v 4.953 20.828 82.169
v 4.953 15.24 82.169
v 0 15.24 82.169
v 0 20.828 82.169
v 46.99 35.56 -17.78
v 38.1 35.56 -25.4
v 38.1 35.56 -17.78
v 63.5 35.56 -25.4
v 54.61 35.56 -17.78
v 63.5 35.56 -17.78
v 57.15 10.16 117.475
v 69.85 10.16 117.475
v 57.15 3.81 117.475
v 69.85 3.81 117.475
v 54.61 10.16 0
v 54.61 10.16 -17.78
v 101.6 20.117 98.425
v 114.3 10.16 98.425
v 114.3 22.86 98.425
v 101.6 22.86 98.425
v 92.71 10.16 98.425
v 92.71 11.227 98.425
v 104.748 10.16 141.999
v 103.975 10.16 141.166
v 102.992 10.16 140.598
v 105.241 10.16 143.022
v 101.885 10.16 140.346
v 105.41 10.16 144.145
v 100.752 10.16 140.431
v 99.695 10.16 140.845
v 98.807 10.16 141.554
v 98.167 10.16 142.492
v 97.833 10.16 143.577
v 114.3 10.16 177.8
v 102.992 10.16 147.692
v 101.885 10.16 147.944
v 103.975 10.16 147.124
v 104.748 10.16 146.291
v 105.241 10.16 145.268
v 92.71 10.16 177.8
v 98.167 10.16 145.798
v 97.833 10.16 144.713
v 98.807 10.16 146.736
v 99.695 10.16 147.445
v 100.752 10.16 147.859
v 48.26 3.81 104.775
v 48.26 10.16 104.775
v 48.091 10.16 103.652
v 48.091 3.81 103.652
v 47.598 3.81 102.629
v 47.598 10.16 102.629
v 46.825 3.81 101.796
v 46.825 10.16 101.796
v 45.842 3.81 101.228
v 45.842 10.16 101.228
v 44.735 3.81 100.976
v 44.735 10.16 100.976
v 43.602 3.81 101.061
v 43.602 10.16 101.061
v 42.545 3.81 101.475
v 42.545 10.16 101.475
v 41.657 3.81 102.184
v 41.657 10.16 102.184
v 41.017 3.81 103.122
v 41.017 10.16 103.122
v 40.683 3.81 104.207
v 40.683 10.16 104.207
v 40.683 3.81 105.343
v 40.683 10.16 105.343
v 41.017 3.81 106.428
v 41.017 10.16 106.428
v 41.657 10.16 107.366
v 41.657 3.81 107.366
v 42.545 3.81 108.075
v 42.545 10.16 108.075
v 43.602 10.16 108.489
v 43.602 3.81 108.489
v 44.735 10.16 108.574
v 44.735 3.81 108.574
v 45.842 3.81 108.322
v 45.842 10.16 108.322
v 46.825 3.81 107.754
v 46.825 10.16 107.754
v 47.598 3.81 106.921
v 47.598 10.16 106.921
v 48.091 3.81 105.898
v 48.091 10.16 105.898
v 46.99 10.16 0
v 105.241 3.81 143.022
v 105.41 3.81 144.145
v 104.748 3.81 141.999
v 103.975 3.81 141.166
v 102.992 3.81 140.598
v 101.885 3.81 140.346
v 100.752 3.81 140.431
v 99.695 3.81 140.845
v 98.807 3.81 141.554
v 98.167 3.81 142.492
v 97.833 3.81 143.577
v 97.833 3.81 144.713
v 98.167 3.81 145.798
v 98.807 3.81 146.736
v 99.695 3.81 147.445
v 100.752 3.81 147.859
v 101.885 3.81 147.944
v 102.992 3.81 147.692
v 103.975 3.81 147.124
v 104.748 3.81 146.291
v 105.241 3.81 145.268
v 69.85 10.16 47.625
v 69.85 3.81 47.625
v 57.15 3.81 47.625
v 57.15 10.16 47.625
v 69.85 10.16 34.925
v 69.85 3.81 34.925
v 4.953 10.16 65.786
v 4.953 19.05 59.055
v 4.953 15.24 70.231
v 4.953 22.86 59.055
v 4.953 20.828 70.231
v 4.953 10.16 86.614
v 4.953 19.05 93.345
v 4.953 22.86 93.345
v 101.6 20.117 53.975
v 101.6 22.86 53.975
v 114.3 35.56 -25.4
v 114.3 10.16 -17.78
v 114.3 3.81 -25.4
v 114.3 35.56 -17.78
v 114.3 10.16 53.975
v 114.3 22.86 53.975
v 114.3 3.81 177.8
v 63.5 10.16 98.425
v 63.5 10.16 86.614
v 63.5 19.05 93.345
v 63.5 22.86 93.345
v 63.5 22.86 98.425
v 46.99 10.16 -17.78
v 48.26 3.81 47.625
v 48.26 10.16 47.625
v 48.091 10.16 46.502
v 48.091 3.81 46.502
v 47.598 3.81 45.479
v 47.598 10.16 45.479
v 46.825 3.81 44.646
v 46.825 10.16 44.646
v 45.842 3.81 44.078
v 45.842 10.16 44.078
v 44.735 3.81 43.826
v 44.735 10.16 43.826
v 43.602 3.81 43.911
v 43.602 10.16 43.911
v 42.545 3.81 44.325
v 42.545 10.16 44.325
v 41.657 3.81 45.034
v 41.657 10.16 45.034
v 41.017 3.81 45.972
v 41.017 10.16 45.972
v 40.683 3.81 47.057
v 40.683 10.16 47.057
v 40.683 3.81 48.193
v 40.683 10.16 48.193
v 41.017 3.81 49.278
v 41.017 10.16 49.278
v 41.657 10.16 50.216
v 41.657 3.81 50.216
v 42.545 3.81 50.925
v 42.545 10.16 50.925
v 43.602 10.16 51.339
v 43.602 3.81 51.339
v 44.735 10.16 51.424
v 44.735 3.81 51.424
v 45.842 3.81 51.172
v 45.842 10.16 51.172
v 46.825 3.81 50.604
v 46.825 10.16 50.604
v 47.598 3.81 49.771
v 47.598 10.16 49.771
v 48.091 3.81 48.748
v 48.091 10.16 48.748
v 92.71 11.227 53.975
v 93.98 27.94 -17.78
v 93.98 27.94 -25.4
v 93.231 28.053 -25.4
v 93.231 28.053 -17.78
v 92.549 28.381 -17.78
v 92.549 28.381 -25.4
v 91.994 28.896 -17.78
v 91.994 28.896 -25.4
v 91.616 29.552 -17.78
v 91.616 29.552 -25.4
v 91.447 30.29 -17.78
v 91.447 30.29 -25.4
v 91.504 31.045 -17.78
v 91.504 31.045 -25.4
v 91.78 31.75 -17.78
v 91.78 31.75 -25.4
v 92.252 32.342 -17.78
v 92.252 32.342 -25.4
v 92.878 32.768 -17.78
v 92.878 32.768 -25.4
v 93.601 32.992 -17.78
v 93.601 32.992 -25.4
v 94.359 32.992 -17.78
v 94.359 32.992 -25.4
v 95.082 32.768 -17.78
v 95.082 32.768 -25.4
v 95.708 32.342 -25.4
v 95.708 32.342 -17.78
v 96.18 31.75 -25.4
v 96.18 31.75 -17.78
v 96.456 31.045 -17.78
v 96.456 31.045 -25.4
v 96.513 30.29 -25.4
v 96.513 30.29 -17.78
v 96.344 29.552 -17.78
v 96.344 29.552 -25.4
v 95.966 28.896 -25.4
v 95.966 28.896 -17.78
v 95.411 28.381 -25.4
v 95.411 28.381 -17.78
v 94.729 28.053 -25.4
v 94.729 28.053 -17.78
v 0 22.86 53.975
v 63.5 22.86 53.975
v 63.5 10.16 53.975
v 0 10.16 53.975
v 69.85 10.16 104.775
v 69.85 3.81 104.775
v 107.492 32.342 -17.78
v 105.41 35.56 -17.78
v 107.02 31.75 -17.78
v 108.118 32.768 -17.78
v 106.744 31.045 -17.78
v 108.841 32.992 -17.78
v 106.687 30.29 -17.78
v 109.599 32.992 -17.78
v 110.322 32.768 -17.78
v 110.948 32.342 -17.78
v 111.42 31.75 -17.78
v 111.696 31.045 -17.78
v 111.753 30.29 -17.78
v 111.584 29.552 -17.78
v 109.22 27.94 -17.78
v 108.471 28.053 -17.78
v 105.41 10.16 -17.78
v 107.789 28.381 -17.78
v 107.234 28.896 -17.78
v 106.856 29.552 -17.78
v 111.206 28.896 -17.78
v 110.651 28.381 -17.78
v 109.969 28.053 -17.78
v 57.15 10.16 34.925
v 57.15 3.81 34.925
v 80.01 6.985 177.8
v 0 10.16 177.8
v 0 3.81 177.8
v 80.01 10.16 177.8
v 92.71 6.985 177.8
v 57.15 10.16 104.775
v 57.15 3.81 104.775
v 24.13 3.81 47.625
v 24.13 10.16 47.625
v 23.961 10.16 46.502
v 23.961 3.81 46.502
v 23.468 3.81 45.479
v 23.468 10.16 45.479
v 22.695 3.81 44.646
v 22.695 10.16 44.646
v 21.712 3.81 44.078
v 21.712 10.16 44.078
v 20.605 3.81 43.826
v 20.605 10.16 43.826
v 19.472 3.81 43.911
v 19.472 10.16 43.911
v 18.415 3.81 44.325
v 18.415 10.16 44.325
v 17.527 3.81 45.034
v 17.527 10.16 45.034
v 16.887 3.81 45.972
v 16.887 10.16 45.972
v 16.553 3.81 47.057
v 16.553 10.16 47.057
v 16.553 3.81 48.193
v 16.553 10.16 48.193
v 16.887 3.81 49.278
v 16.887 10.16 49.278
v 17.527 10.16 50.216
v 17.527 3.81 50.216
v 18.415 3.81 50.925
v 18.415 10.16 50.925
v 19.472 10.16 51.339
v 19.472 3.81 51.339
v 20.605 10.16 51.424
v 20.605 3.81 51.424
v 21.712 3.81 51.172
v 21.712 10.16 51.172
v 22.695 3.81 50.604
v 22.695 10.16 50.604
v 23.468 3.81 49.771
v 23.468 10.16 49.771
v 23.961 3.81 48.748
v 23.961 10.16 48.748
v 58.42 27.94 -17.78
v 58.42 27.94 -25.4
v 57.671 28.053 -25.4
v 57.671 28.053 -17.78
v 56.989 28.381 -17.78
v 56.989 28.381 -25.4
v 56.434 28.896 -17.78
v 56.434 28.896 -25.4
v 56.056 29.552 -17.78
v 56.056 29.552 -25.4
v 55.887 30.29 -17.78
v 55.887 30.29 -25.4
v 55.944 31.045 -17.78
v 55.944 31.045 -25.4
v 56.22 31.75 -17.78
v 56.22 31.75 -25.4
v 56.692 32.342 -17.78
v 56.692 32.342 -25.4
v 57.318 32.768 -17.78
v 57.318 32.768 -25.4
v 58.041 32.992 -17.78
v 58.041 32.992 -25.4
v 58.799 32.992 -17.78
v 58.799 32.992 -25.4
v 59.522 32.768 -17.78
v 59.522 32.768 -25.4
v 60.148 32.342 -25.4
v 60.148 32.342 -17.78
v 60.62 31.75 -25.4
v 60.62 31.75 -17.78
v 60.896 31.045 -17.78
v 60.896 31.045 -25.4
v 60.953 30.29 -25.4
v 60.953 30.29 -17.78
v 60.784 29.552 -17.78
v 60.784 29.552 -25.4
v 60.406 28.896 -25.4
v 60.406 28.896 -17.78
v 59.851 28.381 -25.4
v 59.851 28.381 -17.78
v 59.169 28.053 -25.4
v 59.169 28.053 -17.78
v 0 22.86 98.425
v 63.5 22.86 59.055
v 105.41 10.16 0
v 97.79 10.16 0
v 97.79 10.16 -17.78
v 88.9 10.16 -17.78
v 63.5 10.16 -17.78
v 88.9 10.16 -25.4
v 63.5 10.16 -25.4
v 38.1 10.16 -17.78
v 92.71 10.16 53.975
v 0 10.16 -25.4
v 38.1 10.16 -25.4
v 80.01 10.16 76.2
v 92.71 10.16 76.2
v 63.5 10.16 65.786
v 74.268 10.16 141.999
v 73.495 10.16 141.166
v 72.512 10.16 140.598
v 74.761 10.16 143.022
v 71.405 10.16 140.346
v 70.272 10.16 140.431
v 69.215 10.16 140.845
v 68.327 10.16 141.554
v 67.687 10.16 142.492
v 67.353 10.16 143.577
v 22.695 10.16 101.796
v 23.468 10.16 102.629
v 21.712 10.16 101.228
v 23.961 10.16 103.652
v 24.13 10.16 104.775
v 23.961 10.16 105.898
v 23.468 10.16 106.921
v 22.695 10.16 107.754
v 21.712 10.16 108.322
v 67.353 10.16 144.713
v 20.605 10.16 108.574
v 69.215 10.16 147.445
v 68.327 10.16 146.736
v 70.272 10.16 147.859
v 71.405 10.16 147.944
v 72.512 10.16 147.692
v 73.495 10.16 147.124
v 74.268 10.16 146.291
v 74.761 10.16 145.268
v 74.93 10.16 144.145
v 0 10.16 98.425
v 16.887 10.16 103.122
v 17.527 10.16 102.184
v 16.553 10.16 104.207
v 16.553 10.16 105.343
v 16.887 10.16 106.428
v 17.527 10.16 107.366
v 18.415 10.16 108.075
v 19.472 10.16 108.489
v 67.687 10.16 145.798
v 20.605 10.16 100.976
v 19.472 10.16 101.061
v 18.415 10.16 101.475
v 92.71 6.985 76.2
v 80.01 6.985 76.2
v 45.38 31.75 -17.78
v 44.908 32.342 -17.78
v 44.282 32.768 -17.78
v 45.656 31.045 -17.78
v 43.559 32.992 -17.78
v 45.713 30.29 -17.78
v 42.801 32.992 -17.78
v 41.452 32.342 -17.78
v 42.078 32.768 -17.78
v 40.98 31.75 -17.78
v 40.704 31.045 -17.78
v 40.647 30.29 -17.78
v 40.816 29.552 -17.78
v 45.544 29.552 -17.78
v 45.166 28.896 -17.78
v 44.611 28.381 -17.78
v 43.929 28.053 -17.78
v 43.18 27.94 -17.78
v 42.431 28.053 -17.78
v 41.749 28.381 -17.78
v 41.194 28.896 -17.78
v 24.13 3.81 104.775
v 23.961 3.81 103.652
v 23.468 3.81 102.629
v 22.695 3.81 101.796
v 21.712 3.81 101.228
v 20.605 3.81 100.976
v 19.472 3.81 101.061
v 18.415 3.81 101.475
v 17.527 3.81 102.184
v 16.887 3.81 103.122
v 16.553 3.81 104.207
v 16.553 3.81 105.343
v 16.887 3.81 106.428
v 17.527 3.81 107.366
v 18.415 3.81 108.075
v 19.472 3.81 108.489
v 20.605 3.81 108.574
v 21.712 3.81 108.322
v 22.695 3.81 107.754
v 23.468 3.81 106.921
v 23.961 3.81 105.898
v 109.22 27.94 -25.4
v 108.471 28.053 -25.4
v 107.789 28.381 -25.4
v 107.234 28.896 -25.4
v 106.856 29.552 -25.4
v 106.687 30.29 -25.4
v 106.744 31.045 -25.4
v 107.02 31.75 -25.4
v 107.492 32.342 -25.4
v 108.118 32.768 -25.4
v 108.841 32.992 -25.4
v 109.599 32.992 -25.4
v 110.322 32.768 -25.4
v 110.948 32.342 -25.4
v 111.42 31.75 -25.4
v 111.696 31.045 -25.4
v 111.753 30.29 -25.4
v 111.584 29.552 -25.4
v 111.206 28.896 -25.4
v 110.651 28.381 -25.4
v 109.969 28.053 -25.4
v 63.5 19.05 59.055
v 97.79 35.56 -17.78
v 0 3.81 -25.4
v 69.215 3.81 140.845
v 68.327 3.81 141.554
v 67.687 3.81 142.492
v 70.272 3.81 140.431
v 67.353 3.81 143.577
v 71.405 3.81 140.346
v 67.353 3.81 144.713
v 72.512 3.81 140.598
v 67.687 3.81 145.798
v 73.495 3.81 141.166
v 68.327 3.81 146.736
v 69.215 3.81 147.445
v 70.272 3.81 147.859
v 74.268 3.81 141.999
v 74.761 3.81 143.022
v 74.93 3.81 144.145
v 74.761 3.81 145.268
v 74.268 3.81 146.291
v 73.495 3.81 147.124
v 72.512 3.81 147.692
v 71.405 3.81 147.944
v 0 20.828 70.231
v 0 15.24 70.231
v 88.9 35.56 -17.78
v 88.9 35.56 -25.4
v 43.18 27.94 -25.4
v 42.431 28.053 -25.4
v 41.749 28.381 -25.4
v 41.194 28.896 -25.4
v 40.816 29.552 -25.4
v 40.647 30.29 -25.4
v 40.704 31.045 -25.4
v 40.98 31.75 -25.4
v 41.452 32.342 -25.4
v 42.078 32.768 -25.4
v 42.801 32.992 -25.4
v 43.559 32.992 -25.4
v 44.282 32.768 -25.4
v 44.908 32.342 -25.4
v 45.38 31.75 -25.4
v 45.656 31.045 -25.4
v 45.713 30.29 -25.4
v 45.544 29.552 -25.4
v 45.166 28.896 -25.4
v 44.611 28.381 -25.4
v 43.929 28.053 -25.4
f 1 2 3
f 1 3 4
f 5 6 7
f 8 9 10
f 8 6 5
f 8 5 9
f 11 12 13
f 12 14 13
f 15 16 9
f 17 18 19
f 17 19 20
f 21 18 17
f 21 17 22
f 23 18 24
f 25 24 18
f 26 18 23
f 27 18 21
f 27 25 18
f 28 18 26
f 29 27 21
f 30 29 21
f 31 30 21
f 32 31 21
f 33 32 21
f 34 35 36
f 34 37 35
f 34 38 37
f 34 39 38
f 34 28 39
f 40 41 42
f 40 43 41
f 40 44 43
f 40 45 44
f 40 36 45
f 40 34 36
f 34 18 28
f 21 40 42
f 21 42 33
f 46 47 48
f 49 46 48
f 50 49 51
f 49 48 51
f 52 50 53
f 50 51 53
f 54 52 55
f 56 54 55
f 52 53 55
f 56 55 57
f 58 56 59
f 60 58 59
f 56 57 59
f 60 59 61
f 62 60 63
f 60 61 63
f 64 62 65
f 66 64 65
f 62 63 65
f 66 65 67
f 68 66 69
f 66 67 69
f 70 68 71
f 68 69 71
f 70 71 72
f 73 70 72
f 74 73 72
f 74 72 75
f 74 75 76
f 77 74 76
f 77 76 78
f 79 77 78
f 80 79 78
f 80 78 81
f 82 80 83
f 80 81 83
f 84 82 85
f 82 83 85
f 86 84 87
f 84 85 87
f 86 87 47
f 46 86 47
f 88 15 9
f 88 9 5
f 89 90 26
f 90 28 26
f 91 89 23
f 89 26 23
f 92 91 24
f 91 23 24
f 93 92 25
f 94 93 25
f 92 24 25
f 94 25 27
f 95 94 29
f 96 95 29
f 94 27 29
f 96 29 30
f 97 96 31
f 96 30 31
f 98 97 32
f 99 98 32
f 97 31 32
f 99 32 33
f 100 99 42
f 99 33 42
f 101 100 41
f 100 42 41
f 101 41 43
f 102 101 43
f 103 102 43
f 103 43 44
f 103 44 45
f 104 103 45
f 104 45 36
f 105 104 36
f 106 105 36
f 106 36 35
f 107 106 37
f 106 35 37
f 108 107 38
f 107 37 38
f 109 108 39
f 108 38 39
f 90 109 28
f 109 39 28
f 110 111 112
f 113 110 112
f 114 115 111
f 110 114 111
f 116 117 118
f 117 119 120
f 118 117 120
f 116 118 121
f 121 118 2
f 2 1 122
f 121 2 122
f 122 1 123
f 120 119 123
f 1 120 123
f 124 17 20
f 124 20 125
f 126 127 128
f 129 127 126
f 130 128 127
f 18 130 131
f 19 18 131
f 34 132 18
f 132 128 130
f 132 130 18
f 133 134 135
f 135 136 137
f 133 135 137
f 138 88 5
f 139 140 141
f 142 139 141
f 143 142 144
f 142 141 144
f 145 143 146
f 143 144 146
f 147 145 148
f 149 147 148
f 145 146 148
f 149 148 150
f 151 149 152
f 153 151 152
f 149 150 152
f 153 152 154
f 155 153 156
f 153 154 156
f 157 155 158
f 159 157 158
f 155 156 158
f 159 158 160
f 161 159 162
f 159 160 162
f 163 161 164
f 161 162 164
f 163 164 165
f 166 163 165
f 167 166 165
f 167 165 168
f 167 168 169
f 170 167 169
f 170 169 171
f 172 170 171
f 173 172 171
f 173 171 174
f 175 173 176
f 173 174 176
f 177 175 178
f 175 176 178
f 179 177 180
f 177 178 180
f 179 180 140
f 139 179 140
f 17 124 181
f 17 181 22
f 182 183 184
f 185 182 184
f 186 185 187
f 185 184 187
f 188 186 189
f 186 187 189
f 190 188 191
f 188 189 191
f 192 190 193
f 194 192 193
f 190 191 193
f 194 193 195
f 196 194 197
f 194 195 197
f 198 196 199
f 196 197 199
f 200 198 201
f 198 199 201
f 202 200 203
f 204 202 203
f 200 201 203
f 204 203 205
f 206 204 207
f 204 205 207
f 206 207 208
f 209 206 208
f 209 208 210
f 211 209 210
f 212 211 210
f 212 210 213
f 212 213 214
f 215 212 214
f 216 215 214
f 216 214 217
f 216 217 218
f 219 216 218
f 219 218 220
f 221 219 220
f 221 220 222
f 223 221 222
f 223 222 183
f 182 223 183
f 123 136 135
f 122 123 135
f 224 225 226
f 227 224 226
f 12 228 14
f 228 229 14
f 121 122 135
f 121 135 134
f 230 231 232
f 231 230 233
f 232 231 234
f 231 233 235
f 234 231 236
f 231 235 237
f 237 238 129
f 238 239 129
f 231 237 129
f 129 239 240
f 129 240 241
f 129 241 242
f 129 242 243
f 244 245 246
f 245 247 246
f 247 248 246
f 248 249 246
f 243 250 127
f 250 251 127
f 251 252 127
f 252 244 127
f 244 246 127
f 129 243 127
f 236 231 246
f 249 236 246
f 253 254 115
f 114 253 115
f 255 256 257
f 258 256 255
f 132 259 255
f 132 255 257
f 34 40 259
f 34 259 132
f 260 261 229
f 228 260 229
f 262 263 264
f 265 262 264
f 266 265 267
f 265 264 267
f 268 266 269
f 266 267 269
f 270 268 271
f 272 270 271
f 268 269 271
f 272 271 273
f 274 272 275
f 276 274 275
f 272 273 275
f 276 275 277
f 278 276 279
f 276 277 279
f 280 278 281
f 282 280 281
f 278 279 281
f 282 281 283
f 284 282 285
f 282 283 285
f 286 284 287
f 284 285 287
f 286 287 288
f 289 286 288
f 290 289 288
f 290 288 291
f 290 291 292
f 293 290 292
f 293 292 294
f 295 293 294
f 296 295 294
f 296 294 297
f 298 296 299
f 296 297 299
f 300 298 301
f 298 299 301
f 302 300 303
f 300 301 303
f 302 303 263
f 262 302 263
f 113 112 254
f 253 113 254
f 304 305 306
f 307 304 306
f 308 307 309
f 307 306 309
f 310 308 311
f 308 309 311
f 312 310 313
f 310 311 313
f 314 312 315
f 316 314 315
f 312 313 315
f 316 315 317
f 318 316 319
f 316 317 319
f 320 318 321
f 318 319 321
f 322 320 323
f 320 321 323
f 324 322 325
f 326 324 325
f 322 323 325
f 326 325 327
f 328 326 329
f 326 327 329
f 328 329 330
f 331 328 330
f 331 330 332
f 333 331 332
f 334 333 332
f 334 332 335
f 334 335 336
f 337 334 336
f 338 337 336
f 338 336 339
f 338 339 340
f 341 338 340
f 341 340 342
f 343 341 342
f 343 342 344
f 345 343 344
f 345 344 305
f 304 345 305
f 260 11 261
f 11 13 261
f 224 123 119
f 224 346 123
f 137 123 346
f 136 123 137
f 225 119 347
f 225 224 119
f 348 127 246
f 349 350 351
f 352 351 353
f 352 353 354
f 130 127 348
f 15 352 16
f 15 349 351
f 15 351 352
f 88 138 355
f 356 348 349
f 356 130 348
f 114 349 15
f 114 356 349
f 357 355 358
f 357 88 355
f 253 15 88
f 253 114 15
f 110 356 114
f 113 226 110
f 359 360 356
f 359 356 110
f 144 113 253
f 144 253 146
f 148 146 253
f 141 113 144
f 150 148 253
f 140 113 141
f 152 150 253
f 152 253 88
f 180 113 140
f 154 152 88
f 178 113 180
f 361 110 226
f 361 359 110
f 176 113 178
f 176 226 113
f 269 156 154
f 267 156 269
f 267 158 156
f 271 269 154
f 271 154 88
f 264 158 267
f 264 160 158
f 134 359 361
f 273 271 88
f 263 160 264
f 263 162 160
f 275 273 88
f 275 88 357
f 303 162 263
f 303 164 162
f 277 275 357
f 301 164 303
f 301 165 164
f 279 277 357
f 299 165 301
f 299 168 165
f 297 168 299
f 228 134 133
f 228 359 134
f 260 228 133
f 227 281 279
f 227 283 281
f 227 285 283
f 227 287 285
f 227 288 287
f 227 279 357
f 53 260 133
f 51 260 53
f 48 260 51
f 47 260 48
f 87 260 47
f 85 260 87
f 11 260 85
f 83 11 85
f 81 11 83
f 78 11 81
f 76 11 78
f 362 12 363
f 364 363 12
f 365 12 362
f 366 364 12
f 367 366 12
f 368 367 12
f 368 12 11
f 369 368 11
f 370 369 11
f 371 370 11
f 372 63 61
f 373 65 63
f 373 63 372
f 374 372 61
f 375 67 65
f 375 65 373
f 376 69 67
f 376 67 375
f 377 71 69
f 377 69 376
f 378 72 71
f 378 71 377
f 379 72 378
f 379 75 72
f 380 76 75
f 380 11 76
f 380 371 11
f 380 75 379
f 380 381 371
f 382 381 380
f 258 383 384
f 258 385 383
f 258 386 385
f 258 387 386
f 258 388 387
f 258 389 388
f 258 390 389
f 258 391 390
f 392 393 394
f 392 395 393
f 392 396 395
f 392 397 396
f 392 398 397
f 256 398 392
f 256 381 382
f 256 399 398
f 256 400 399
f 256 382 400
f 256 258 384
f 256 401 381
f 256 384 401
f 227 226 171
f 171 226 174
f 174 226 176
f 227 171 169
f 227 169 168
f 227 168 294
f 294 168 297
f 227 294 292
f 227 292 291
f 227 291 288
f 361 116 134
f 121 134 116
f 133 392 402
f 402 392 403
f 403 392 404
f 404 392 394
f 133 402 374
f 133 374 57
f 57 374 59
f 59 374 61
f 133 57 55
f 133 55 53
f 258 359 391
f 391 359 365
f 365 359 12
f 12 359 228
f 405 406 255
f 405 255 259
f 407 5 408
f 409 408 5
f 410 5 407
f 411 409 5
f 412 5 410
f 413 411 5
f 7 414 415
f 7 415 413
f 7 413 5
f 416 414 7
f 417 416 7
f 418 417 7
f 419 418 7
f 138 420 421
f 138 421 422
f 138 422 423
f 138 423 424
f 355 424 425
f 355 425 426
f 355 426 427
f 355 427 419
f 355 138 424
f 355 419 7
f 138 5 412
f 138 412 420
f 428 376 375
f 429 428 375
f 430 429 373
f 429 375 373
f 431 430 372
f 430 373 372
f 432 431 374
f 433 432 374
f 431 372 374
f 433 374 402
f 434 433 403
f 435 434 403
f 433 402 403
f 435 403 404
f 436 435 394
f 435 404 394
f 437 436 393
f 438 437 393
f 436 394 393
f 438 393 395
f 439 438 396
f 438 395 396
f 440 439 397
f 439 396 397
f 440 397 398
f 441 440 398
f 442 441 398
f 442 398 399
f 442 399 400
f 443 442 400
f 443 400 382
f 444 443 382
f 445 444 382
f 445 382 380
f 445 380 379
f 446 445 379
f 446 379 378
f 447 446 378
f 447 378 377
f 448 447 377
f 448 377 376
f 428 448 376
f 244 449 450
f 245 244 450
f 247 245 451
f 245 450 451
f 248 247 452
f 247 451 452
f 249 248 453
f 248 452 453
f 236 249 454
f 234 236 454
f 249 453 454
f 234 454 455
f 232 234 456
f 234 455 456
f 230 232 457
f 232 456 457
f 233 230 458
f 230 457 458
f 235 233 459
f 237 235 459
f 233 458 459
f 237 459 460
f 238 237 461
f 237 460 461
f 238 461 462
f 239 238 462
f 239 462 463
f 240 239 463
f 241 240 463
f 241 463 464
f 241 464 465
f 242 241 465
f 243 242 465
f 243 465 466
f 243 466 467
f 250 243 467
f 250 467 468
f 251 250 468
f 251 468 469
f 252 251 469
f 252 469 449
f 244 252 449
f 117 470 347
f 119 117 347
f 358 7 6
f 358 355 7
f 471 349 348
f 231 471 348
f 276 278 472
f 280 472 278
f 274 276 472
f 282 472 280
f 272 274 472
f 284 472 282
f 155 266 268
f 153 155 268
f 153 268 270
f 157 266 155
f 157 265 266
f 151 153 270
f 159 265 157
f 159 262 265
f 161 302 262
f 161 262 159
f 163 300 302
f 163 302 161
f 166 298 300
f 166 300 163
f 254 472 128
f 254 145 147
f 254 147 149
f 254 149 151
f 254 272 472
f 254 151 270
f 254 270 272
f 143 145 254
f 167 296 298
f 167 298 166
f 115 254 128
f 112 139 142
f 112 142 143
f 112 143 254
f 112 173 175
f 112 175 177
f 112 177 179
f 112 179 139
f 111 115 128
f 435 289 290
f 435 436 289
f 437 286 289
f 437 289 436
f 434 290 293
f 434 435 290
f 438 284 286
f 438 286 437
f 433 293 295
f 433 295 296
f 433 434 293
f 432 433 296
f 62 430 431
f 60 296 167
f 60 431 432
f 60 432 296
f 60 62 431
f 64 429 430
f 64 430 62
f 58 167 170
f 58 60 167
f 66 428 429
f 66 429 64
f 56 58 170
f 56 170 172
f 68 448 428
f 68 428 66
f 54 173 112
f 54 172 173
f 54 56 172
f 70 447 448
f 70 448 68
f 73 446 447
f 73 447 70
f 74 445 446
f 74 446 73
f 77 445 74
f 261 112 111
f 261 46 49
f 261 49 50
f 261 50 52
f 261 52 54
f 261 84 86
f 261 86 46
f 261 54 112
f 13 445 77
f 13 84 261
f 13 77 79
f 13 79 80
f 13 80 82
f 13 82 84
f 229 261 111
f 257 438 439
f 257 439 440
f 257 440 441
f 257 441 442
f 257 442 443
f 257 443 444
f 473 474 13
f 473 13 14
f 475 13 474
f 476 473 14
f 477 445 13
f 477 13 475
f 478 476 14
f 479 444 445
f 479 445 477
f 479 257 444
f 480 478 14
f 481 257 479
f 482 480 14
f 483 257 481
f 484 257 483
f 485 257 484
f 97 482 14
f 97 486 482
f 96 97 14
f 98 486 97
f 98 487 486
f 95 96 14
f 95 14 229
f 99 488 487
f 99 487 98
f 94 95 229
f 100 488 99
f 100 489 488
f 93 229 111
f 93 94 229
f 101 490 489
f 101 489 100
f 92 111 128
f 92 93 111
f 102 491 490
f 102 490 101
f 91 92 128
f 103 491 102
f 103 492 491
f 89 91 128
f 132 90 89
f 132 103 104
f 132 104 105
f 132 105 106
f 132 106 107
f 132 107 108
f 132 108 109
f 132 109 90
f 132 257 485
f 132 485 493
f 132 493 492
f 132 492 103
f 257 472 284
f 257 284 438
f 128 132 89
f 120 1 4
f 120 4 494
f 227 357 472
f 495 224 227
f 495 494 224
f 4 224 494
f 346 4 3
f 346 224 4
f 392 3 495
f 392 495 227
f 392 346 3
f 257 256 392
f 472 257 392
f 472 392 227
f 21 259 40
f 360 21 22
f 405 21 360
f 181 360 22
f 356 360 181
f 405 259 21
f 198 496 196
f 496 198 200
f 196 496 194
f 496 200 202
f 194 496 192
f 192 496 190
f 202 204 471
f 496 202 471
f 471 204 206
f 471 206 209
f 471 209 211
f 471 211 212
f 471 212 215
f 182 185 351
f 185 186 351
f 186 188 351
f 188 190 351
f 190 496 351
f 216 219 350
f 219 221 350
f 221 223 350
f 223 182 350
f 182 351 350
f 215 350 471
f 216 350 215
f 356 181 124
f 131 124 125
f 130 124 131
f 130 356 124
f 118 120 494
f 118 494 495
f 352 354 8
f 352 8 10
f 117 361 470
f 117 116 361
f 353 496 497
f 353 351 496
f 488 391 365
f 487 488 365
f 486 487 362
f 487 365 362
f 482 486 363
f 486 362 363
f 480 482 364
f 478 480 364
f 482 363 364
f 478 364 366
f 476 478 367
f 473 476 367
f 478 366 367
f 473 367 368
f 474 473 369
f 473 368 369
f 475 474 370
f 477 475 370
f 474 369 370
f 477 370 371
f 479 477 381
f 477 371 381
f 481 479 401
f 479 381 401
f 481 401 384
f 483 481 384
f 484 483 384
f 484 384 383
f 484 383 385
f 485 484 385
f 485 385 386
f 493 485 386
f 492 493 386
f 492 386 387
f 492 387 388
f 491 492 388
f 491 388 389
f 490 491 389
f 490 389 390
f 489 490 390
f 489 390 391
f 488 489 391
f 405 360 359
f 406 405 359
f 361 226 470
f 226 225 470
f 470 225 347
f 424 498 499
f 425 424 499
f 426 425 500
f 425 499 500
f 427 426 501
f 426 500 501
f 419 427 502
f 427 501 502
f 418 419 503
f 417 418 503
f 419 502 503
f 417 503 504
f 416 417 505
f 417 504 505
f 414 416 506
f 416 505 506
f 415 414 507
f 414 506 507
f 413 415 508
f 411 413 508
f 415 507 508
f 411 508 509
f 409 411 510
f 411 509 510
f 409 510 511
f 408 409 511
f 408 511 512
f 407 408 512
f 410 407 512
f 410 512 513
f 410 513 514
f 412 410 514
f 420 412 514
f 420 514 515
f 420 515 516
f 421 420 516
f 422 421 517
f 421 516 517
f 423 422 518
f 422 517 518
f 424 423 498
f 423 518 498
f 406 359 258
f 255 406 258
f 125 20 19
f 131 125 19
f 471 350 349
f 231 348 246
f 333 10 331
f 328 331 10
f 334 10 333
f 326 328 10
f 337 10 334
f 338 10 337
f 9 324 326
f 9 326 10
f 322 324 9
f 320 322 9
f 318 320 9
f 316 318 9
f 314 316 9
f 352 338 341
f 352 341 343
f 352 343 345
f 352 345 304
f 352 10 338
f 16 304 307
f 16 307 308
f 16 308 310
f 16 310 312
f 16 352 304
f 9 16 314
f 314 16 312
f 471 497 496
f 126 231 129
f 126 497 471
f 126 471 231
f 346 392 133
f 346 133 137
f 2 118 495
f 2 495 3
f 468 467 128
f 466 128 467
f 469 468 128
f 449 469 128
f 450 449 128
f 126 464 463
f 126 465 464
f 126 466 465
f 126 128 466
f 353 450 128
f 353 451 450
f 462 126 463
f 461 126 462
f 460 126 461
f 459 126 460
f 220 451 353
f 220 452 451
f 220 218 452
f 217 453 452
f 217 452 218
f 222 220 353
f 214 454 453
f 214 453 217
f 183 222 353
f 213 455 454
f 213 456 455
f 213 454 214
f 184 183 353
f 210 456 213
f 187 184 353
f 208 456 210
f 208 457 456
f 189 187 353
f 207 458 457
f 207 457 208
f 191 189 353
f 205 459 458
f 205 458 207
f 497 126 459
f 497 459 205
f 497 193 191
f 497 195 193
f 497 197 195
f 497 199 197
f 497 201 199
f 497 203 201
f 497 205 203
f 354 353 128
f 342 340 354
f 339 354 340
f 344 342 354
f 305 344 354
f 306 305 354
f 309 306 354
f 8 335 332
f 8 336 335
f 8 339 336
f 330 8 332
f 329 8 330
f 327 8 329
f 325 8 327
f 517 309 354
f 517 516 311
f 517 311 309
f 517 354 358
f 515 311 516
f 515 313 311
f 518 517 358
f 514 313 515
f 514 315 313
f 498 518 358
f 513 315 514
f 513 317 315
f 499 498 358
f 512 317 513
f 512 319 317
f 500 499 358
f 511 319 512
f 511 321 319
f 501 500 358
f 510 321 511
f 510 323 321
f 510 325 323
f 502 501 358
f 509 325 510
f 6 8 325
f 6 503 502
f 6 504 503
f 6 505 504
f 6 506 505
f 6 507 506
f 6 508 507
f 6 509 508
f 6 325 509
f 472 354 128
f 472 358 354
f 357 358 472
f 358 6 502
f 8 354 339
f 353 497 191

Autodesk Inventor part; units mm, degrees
ref_plane "YZ Plane" through (0, 0, 0) normal (1, 0, 0) x (0, 1, 0)
ref_plane "XZ Plane" through (0, 0, 0) normal (0, 1, 0) x (-1, 0, 0)
ref_plane "XY Plane" through (0, 0, 0) normal (0, 0, 1) x (1, 0, 0)
sketch "Sketch1" plane through (0, 0, 0) normal (0, 1, 0) x (-1, 0, 0)
  line L0 (0, 0) -> (-114.3, 0)
  line L1 (-114.3, 0) -> (-114.3, 152.4)
  line L2 (-114.3, 152.4) -> (0, 152.4)
  line L3 (0, 152.4) -> (0, 0)
  line L4 (-57.15, 34.925) -> (-69.85, 34.925)
  line L5 (-69.85, 34.925) -> (-69.85, 47.625)
  line L6 (-69.85, 47.625) -> (-57.15, 47.625)
  line L7 (-57.15, 47.625) -> (-57.15, 34.925)
  line L8 (-57.15, 104.775) -> (-69.85, 104.775)
  line L9 (-69.85, 104.775) -> (-69.85, 117.475)
  line L10 (-69.85, 117.475) -> (-57.15, 117.475)
  line L11 (-57.15, 117.475) -> (-57.15, 104.775)
  dimension "d0" = 152.4
  dimension "d1" = 114.3
  dimension "d2" = 12.7
  dimension "d3" = 12.7
  dimension "d4" = 12.7
  dimension "d5" = 12.7
  dimension "d6" = 34.925
  dimension "d7" = 34.925
  dimension "d8" = 44.45
  dimension "d9" = 44.45
extrude "Extrusion1" add sketch "Sketch1" along normal blind 10.16
sketch "Sketch2" plane through (0, 0, 0) normal (-1, 0, 0) x (0, 0, 1)
  line L0 (0, 10.16) -> (152.4, 10.16) projected
  line L1 (53.975, 10.16) -> (98.425, 10.16)
  line L2 (98.425, 10.16) -> (98.425, 22.86)
  line L3 (98.425, 22.86) -> (93.345, 22.86)
  line L4 (93.345, 22.86) -> (93.345, 19.05)
  line L5 (93.345, 19.05) -> (86.614, 10.16)
  line L6 (86.614, 10.16) -> (76.2, 10.16)
  line L7 (65.786, 10.16) -> (59.055, 19.05)
  line L8 (59.055, 19.05) -> (59.055, 22.86)
  line L9 (59.055, 22.86) -> (53.975, 22.86)
  line L10 (53.975, 22.86) -> (53.975, 10.16)
  line L11 (0, 0) -> (0, 10.16) projected
  dimension "d12" = 0
  dimension "d13" = 20.828
  dimension "d14" = 44.45
  dimension "d15" = 3.81
  dimension "d16" = 3.81
  dimension "d17" = 12.7
  dimension "d18" = 12.7
  dimension "d19" = 5.08
  dimension "d20" = 5.08
  dimension "d21" = 11.811
  dimension "d24" = 53.975
extrude "Extrusion2" add sketch "Sketch2" against normal blind 63.5
sketch "Sketch4" plane through (0, 10.16, 0) normal (0, 1, 0) x (1, 0, 0)
  circle A0 centre (20.32, -47.625) radius 3.81
  circle A1 centre (44.45, -47.625) radius 3.81
  circle A2 centre (20.32, -104.775) radius 3.81
  circle A3 centre (44.45, -104.775) radius 3.81
  line L0 (0, -53.975) -> (63.5, -53.975) projected
  line L1 (63.5, -98.425) -> (0, -98.425) projected
  line L2 (0, -98.425) -> (0, -152.4) projected
  line L3 (0, 0) -> (0, -53.975) projected
  dimension "d28" = 7.62
  dimension "d29" = 7.62
  dimension "d30" = 7.62
  dimension "d31" = 7.62
  dimension "d32" = 6.35
  dimension "d33" = 6.35
  dimension "d34" = 6.35
  dimension "d35" = 6.35
  dimension "d36" = 20.32
  dimension "d37" = 44.45
  dimension "d38" = 20.32
  dimension "d39" = 44.45
extrude "Extrusion4" cut sketch "Sketch4" against normal blind 10.16
sketch "Sketch5" plane through (0, 0, 152.4) normal (0, 0, 1) x (1, 0, 0)
  line L0 (0, 0) -> (114.3, 0) projected
  line L1 (0, 10.16) -> (114.3, 10.16)
  line L2 (114.3, 10.16) -> (114.3, 0)
  line L3 (114.3, 0) -> (0, 0)
  line L4 (0, 0) -> (0, 10.16)
extrude "Extrusion5" add sketch "Sketch5" along normal blind 25.4
sketch "Sketch6" plane through (114.3, 0, 0) normal (0, 0, -1) x (-1, 0, 0)
  line L0 (0, 10.16) -> (114.3, 10.16) projected
  line L1 (114.3, 0) -> (0, 0) projected
  line L2 (0, 10.16) -> (114.3, 10.16)
  line L3 (114.3, 10.16) -> (114.3, 0)
  line L4 (114.3, 0) -> (0, 0)
  line L5 (0, 0) -> (0, 10.16)
extrude "Extrusion6" add sketch "Sketch6" along normal blind 25.4
sketch "Sketch7" plane through (0, 10.16, 0) normal (0, 1, 0) x (1, 0, 0)
  line L0 (114.3, 25.4) -> (114.3, -177.8) projected
  line L1 (114.3, -98.425) -> (101.6, -98.425)
  line L2 (101.6, -98.425) -> (101.6, -53.975)
  line L3 (101.6, -53.975) -> (114.3, -53.975)
  line L4 (114.3, -53.975) -> (114.3, -98.425)
  line L5 (0, -98.425) -> (63.5, -98.425) projected
  line L6 (0, -53.975) -> (63.5, -53.975) projected
  point P0 (0, 0)
  dimension "d46" = 0
  dimension "d47" = 0
  dimension "d48" = 12.7
extrude "Extrusion7" add sketch "Sketch7" along normal blind 12.7
sketch "Sketch8" plane through (0, 10.16, 0) normal (0, 1, 0) x (1, 0, 0)
  line L0 (114.3, -177.8) -> (0, -177.8) projected
  line L1 (80.01, -177.8) -> (92.71, -177.8)
  line L2 (92.71, -177.8) -> (92.71, -76.2)
  line L3 (92.71, -76.2) -> (80.01, -76.2)
  line L4 (80.01, -76.2) -> (80.01, -177.8)
  line L5 (101.6, -98.425) -> (101.6, -53.975) projected
  point P0 (0, 0)
  dimension "d51" = 8.89
  dimension "d52" = 12.7
  dimension "d53" = 101.6
extrude "Extrusion8" cut sketch "Sketch8" against normal blind 3.175
sketch "Sketch9" plane through (0, 0, 0) normal (0, -1, 0) x (1, 0, 0)
  line L0 (0, 177.8) -> (0, -25.4) projected
  line L1 (114.3, 177.8) -> (92.71, 177.8) projected
  line L2 (0, -25.4) -> (114.3, -25.4)
  line L3 (114.3, -25.4) -> (114.3, 177.8)
  line L4 (114.3, 177.8) -> (0, 177.8)
  line L5 (0, 177.8) -> (0, -25.4)
  point P0 (0, 0)
extrude "Extrusion9" cut sketch "Sketch9" against normal blind 3.81
sketch "Sketch10" plane through (0, 10.16, 0) normal (0, 1, 0) x (1, 0, 0)
  circle A0 centre (71.12, -144.145) radius 3.81
  circle A1 centre (101.6, -144.145) radius 3.81
  line L0 (0, -93.345) -> (63.5, -93.345) projected
  line L1 (92.71, -76.2) -> (92.71, -177.8) projected
  line L2 (80.01, -177.8) -> (80.01, -76.2) projected
  point P0 (0, 0)
  dimension "d58" = 50.8
  dimension "d59" = 50.8
  dimension "d60" = 7.62
  dimension "d61" = 7.62
  dimension "d68" = 8.89
  dimension "d69" = 8.89
extrude "Extrusion10" cut sketch "Sketch10" against normal blind 25.4
sketch "Sketch13" plane through (0, 22.86, 59.055) normal (0, 1, 0) x (1, 0, 0)
  line L0 (0, 0) -> (63.5, 0) projected
  line L1 (0, -34.29) -> (63.5, -34.29) projected
  line L2 (0, 0) -> (4.953, 0)
  line L3 (4.953, 0) -> (4.953, -34.29)
  line L4 (4.953, -34.29) -> (0, -34.29)
  line L5 (0, -34.29) -> (0, 0)
  point P0 (0, 59.055)
  dimension "d70" = 4.953
extrude "Extrusion13" add sketch "Sketch13" against normal blind 12.7
sketch "Sketch14" plane through (4.953, 22.86, 93.345) normal (1, 0, 0) x (0, 0, -1)
  line L0 (11.176, -2.032) -> (23.114, -2.032)
  line L1 (23.114, -2.032) -> (23.114, -7.62)
  line L2 (23.114, -7.62) -> (11.176, -7.62)
  line L3 (11.176, -7.62) -> (11.176, -2.032)
  line L4 (27.559, -12.7) -> (6.731, -12.7) projected
  point P0 (93.345, -22.86)
  dimension "d73" = 5.08
  dimension "d74" = 5.588
  dimension "d75" = 4.445
  dimension "d76" = 4.445
extrude "Extrusion14" cut sketch "Sketch14" against normal blind 12.7
sketch "Sketch15" plane through (0, 10.16, 0) normal (0, 1, 0) x (1, 0, 0)
  line L0 (101.6, -98.425) -> (92.71, -98.425)
  line L1 (92.71, -98.425) -> (92.71, -53.975)
  line L2 (92.71, -53.975) -> (101.6, -53.975)
  line L3 (101.6, -53.975) -> (101.6, -98.425)
  line L4 (101.6, -53.975) -> (114.3, -53.975) projected
  line L5 (92.71, -76.2) -> (92.71, -177.8) projected
  point P0 (0, 0)
  point P1 (92.71, -176.403)
  dimension "d79" = 0
  dimension "d80" = 0
extrude "Extrusion15" add sketch "Sketch15" along normal blind 9.9568
chamfer "Chamfer1" distance 8.89 angle 45 1 edges at (92.71, 20.1168, 76.2)
sketch "Sketch19" plane through (0, 10.16, 0) normal (0, 1, 0) x (1, 0, 0)
  line L0 (114.3, 25.4) -> (88.9, 25.4)
  line L1 (114.3, 25.4) -> (0, 25.4) projected
  line L2 (88.9, 17.78) -> (97.79, 17.78)
  line L3 (97.79, 17.78) -> (97.79, 0)
  line L4 (97.79, 0) -> (105.41, 0)
  line L5 (105.41, 0) -> (105.41, 17.78)
  line L6 (105.41, 17.78) -> (114.3, 17.78)
  line L7 (114.3, -177.8) -> (114.3, 25.4) projected
  line L8 (114.3, 17.78) -> (114.3, 25.4)
  line L9 (88.9, 17.78) -> (88.9, 25.4)
  line L10 (63.5, 25.4) -> (63.5, 17.78)
  line L11 (63.5, 17.78) -> (54.61, 17.78)
  line L12 (54.61, 17.78) -> (54.61, 0)
  line L13 (54.61, 0) -> (46.99, 0)
  line L14 (46.99, 0) -> (46.99, 17.78)
  line L15 (46.99, 17.78) -> (38.1, 17.78)
  line L16 (38.1, 17.78) -> (38.1, 25.4)
  line L17 (63.5, 25.4) -> (38.1, 25.4)
  point P0 (0, 0)
  dimension "d118" = 25.4
  dimension "d119" = 25.4
  dimension "d120" = 25.4
  dimension "d121" = 7.62
  dimension "d122" = 7.62
  dimension "d123" = 8.89
  dimension "d124" = 7.62
  dimension "d125" = 17.78
  dimension "d126" = 17.78
  dimension "d127" = 7.62
  dimension "d128" = 8.89
extrude "Extrusion18" add sketch "Sketch19" along normal blind 25.4
chamfer "Chamfer4" distance 17.78 distance2 25.4 1 edges at (50.8, 35.56, 0) measured on face at (52.07, 35.56, -22.86)
chamfer "Chamfer5" distance 17.78 distance2 25.4 1 edges at (101.6, 35.56, 0) measured on face at (100.33, 35.56, -22.86)
sketch "Sketch20" plane through (54.61, 10.16, -17.78) normal (0, 0, 1) x (1, 0, 0)
  line L0 (-16.51, 25.4) -> (-7.62, 25.4) projected
  line L1 (-16.51, 0) -> (-16.51, 25.4) projected
  line L2 (0, 25.4) -> (8.89, 25.4) projected
  line L3 (8.89, 0) -> (8.89, 25.4) projected
  line L4 (34.29, 0) -> (34.29, 25.4) projected
  line L5 (34.29, 25.4) -> (43.18, 25.4) projected
  line L6 (50.8, 25.4) -> (59.69, 25.4) projected
  line L7 (59.69, 0) -> (59.69, 25.4) projected
  point P0 (-54.61, -10.16)
  point P1 (-11.43, 20.32)
  point P2 (3.81, 20.32)
  point P3 (39.37, 20.32)
  point P4 (54.61, 20.32)
  dimension "d137" = 5.08
  dimension "d138" = 5.08
  dimension "d139" = 5.08
  dimension "d140" = 5.08
  dimension "d141" = 5.08
  dimension "d142" = 5.08
  dimension "d143" = 5.08
  dimension "d144" = 5.08
hole "Hole1" at (43.18, 30.48, -17.78) at (58.42, 30.48, -17.78) at (93.98, 30.48, -17.78) at (109.22, 30.48, -17.78) direction (0, 0, -1) diameter 5.08 end through all
properties part number "Elevator Slide Top"
